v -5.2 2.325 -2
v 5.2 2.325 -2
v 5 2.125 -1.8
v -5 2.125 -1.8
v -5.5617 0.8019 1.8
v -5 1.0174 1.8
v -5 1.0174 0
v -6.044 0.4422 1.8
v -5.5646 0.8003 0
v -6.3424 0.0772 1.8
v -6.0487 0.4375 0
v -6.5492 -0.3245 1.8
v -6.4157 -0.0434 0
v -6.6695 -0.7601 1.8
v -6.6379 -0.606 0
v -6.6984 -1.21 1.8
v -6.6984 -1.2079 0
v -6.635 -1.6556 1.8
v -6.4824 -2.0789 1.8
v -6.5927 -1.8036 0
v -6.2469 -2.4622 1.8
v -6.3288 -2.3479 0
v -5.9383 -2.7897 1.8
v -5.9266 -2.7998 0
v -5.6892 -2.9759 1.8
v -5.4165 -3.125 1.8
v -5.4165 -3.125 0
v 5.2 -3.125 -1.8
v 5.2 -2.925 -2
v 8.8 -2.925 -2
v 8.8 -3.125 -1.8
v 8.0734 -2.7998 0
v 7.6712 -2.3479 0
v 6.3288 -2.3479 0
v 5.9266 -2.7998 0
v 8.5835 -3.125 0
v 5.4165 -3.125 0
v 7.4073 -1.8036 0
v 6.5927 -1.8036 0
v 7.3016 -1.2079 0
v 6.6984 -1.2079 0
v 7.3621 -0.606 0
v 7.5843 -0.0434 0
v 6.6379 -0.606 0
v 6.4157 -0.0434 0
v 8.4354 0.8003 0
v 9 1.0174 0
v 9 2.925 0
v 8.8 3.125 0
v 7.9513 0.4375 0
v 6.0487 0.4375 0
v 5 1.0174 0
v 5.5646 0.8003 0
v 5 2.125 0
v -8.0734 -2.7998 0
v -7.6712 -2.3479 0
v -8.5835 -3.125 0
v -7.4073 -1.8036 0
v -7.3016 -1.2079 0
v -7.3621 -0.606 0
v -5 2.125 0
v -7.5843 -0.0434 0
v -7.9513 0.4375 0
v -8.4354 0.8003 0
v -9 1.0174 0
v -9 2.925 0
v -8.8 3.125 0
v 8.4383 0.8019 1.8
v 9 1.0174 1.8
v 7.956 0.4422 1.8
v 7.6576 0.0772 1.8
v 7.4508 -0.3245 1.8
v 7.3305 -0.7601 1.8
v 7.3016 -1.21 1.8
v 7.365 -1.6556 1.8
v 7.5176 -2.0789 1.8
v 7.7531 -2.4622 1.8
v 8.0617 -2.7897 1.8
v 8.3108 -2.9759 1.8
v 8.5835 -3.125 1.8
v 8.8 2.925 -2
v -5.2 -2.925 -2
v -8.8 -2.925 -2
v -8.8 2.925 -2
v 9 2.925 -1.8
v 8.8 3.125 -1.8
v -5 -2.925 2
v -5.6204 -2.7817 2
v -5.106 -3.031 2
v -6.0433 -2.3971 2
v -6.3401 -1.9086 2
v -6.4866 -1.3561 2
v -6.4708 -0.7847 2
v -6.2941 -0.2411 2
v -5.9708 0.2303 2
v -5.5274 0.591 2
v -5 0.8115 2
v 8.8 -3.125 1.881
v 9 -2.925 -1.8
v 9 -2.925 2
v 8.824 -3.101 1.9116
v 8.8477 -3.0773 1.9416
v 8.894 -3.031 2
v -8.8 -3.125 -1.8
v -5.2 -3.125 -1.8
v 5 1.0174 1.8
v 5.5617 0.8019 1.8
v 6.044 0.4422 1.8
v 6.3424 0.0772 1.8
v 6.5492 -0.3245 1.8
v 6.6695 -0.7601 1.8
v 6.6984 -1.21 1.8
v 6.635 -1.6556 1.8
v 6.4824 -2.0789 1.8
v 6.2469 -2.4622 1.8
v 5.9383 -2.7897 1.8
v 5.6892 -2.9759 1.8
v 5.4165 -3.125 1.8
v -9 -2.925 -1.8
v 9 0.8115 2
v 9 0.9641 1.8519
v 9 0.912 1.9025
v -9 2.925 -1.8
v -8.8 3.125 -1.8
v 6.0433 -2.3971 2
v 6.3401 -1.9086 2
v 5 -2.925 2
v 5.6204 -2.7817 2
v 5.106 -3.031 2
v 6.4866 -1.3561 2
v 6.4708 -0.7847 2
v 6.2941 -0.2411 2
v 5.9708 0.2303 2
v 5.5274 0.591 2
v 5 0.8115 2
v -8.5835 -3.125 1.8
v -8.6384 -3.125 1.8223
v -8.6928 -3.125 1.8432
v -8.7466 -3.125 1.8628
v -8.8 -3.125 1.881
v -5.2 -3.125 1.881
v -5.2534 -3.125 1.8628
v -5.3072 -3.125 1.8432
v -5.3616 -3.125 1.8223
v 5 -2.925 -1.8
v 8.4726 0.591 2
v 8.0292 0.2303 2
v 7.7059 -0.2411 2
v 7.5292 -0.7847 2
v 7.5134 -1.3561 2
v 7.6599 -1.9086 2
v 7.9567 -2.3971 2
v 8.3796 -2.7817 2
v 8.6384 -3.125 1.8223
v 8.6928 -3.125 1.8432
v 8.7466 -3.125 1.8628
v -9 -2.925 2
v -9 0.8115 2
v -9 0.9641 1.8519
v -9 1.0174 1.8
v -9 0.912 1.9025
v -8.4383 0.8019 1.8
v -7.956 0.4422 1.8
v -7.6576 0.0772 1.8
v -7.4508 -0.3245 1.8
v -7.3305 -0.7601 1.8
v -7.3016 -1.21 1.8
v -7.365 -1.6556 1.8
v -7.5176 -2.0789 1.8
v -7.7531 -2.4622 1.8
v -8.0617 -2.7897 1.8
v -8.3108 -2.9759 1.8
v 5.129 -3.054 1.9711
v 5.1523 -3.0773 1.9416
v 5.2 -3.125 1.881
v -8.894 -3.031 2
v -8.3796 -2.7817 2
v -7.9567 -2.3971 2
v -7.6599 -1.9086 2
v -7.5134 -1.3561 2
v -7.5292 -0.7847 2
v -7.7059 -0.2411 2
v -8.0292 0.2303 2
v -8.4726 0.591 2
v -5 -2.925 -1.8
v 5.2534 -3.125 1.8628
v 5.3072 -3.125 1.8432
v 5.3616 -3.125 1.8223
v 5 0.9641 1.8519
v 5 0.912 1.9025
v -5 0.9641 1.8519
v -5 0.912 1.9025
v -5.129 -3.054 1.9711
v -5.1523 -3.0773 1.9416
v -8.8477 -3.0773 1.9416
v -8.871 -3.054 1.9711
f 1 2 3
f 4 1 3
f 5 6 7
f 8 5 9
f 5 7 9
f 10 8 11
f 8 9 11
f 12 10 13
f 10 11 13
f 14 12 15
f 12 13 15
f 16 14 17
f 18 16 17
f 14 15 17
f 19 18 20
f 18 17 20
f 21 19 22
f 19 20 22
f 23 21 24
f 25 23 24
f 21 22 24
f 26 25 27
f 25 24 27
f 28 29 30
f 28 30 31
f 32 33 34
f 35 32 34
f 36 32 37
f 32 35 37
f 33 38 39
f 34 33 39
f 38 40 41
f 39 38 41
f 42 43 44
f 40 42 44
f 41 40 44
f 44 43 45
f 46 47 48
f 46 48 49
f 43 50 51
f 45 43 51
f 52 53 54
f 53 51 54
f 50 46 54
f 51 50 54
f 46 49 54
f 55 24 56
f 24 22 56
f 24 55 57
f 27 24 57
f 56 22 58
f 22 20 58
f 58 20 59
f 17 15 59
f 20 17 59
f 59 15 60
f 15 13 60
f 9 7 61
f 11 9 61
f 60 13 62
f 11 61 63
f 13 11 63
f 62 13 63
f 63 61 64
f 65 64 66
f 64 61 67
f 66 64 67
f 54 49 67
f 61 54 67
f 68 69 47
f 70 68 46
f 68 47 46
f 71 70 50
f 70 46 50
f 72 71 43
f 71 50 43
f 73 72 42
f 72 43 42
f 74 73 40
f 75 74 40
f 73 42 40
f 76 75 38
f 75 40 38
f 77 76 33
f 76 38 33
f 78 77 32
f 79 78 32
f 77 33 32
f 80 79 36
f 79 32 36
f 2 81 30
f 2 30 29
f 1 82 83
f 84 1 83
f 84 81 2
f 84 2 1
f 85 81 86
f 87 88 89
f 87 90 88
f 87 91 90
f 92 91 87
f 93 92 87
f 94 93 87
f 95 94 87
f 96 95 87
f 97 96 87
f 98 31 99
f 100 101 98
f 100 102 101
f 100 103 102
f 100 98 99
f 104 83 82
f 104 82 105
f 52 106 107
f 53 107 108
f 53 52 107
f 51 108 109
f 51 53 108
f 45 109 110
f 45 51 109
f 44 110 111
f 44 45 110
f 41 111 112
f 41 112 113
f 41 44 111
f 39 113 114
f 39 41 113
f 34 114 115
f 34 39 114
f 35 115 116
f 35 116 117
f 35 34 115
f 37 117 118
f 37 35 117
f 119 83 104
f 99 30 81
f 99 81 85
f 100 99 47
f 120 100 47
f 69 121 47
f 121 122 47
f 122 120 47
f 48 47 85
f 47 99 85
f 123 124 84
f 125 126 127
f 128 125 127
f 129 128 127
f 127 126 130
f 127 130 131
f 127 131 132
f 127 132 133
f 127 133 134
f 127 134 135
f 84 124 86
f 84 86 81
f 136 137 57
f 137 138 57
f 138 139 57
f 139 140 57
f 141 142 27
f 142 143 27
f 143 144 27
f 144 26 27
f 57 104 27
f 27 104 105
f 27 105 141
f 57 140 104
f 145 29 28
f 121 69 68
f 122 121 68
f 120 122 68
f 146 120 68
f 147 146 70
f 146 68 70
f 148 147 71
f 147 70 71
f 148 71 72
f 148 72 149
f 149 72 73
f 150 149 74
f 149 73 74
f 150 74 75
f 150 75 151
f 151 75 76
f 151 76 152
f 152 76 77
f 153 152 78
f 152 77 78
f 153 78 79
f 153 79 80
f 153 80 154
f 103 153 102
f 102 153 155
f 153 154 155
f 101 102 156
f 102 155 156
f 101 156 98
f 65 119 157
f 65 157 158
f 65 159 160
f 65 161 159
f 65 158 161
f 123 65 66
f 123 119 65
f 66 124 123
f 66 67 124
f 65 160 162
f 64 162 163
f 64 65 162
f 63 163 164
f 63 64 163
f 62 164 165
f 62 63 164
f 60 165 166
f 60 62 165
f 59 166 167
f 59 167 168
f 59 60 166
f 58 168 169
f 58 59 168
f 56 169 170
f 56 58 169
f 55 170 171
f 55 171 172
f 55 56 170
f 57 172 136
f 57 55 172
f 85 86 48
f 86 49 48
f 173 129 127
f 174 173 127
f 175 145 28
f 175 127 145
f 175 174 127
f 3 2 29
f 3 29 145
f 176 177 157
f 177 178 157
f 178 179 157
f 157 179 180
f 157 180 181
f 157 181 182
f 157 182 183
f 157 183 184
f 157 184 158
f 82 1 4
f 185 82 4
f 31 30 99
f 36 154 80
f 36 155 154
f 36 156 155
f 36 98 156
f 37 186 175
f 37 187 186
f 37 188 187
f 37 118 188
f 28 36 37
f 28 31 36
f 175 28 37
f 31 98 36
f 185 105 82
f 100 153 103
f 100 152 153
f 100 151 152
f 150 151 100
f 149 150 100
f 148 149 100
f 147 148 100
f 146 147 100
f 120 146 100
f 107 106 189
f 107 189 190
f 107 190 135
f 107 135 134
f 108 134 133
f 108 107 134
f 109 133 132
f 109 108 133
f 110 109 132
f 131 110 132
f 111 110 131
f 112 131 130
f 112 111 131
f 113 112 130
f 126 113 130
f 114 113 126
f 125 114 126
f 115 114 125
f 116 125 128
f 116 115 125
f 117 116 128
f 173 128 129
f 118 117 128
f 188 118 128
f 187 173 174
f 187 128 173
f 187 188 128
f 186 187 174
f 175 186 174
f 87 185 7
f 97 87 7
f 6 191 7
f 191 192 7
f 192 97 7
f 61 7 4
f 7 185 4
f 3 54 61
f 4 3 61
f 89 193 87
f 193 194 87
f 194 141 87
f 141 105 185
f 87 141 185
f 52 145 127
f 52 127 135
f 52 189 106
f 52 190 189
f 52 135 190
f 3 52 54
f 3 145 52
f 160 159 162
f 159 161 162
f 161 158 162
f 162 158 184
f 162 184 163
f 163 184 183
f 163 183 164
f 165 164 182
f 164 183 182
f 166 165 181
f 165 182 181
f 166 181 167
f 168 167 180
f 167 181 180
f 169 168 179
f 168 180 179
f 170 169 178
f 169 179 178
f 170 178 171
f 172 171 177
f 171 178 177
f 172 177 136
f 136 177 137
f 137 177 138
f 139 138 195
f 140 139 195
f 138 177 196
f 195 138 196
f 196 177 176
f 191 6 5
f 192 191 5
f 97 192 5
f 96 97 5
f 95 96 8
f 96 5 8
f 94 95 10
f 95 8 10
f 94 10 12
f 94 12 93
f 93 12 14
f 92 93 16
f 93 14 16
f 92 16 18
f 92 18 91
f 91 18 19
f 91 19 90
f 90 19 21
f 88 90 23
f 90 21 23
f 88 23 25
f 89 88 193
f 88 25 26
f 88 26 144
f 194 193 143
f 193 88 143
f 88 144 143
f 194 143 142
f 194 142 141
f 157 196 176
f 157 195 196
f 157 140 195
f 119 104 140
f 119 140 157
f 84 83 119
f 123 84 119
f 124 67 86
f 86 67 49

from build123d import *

# Parameters (mm, degrees)
BOSS_EXTRUDE1_DEPTH  = 2
BOSS_EXTRUDE2_DEPTH  = 2
MIRROR2_COPY_1_DEPTH = 2


with BuildPart() as part:
    # Sketch1 → Boss-Extrude1 (new body)
    with BuildSketch(Plane.XY):
        Polygon((-9, 3.125), (9, 3.125), (9, -3.125), (5, -3.125), (5, 2.125), (-5, 2.125), (-5, -3.125), (-9, -3.125), align=None)
    extrude(amount=-BOSS_EXTRUDE1_DEPTH)

    # Sketch2 → Boss-Extrude2 (add)
    with BuildSketch(Plane.XY):
        with BuildLine():
            Line((9, -3.125), (9, 1.017428529))
            ThreePointArc((9, 1.017428529), (7.311037389, -0.904903006), (8.583484861, -3.125))
            Line((8.583484861, -3.125), (9, -3.125))
        make_face()
    boss_extrude2 = extrude(amount=BOSS_EXTRUDE2_DEPTH)

    # Mirror1: Boss-Extrude2 across plane
    add(boss_extrude2.mirror(Plane(origin=(7, 0, 0), x_dir=(0, 0, 1), z_dir=(1, 0, 0))))

    # Mirror2: Boss-Extrude2 across plane
    add(boss_extrude2.mirror(Plane(origin=(0, 0, 0), x_dir=(0, 0, 1), z_dir=(1, 0, 0))))

    # Mirror2 copy 1 sketch → Mirror2 copy 1 (add)
    with BuildSketch(Plane(origin=(-14, 0, 0), x_dir=(1, 0, 0), z_dir=(0, 0, 1))):
        with BuildLine():
            Line((9, -3.125), (9, 1.017428529))
            ThreePointArc((9, 1.017428529), (7.311037389, -0.904903006), (8.583484861, -3.125))
            Line((8.583484861, -3.125), (9, -3.125))
        make_face()
    extrude(amount=MIRROR2_COPY_1_DEPTH)

    # Deburs
    # the kernel refuses this chamfer: 0.2 mm, written as the material it takes off along each edge
    with BuildSketch(Plane(origin=(-8.866666667, 2.991666667, -1.866666667), x_dir=(0, -0.7071067811865479, -0.7071067811865471), z_dir=(-0.5773502691896264, 0.5773502691896251, -0.5773502691896257)), Plane(origin=(5.133333333, -2.991666667, -1.866666667), x_dir=(0, -0.7071067811865479, 0.7071067811865471), z_dir=(-0.5773502691896256, -0.5773502691896256, -0.5773502691896262)), Plane(origin=(-8.866666667, -2.991666667, -1.866666667), x_dir=(0, -0.7071067811865479, 0.7071067811865471), z_dir=(-0.5773502691896272, -0.5773502691896246, -0.5773502691896253))) as deburs_piece_1:
        Polygon((-0.141421356, -0.081649658), (0.141421356, -0.081649658), (0, 0.163299316), align=None)
    extrude(amount=0.254034118, mode=Mode.SUBTRACT)
    with BuildSketch(Plane(origin=(8.866666667, 2.991666667, -1.866666667), x_dir=(0, -0.7071067811865479, -0.7071067811865471), z_dir=(0.5773502691896272, 0.5773502691896246, -0.5773502691896253)), Plane(origin=(8.866666667, -2.991666667, -1.866666667), x_dir=(-0.7071067811865465, 0, -0.7071067811865488), z_dir=(0.5773502691896272, -0.5773502691896246, -0.5773502691896253)), Plane(origin=(-5.133333333, -2.991666667, -1.866666667), x_dir=(3.140184917367542e-15, -0.7071067811865464, 0.7071067811865487), z_dir=(0.5773502691896256, -0.5773502691896255, -0.5773502691896262))) as deburs_piece_2:
        Polygon((-0.141421356, 0.081649658), (0.141421356, 0.081649658), (0, -0.163299316), align=None)
    extrude(amount=0.254034118, mode=Mode.SUBTRACT)
    with BuildSketch(Plane(origin=(-9.514336598, 3.125, -2), x_dir=(0, 0.02749587661058736, 0.9996219169112966), z_dir=(1, 0, 0))) as deburs_piece_3:
        with BuildLine():
            Line((0.205734639, 0), (-0.011309431, 0.205423559))
            Line((-0.011309431, 0.205423559), (-0.015307919, 0.205313575))
            ThreePointArc((-0.015307919, 0.205313575), (-0.006825845, 0.102679566), (-0.003998488, -0.000109984))
            Line((-0.003998488, -0.000109984), (0.000109984, -0.003998488))
            ThreePointArc((0.000109984, -0.003998488), (0.102899533, -0.00117113), (0.205844623, -0.003998488))
            Line((0.205844623, -0.003998488), (0.205734639, 0))
        make_face()
    extrude(amount=19.028673195, mode=Mode.SUBTRACT)
    with BuildSketch(Plane(origin=(9, 3.125, 0.514336598), x_dir=(-0.9996219169112966, 0.02749587661058742, 0), z_dir=(0, 0, -1))) as deburs_piece_4:
        with BuildLine():
            Line((0.205734639, 0), (-0.011309431, -0.205423559))
            Line((-0.011309431, -0.205423559), (-0.015307919, -0.205313575))
            ThreePointArc((-0.015307919, -0.205313575), (-0.006825845, -0.102679566), (-0.003998488, 0.000109984))
            Line((-0.003998488, 0.000109984), (0.000109984, 0.003998488))
            ThreePointArc((0.000109984, 0.003998488), (0.102899533, 0.00117113), (0.205844623, 0.003998488))
            Line((0.205844623, 0.003998488), (0.205734639, 0))
        make_face()
    extrude(amount=3.028673195, mode=Mode.SUBTRACT)
    with BuildSketch(Plane(origin=(9, 3.639336598, -2), x_dir=(-0.9996219169112966, 0, -0.02749587661058742), z_dir=(0, -1, 0)), Plane(origin=(-9, -3.639336598, -2), x_dir=(0.9996219169112966, 0, -0.02749587661058742), z_dir=(0, 1, 0))) as deburs_piece_5:
        with BuildLine():
            Line((0.205734639, 0), (-0.011309431, -0.205423559))
            Line((-0.011309431, -0.205423559), (-0.015307919, -0.205313575))
            ThreePointArc((-0.015307919, -0.205313575), (-0.006825845, -0.102679566), (-0.003998488, 0.000109984))
            Line((-0.003998488, 0.000109984), (0.000109984, 0.003998488))
            ThreePointArc((0.000109984, 0.003998488), (0.102899533, 0.00117113), (0.205844623, 0.003998488))
            Line((0.205844623, 0.003998488), (0.205734639, 0))
        make_face()
    extrude(amount=7.278673195, mode=Mode.SUBTRACT)
    with BuildSketch(Plane(origin=(9, -3.125, 2.514336598), x_dir=(-0.9996219169112966, -0.02749587661058742, 0), z_dir=(0, 0, -1)), Plane(origin=(5, -3.125, 2.514336598), x_dir=(-0.027495876610587302, 0.9996219169112966, 0), z_dir=(0, 0, -1)), Plane(origin=(-9, -3.125, -2.514336598), x_dir=(0.9996219169112966, -0.02749587661058742, -1.3226059551012301e-15), z_dir=(0, 0, 1))) as deburs_piece_6:
        with BuildLine():
            Line((0.205734639, 0), (-0.011309431, 0.205423559))
            Line((-0.011309431, 0.205423559), (-0.015307919, 0.205313575))
            ThreePointArc((-0.015307919, 0.205313575), (-0.006825845, 0.102679566), (-0.003998488, -0.000109984))
            Line((-0.003998488, -0.000109984), (0.000109984, -0.003998488))
            ThreePointArc((0.000109984, -0.003998488), (0.102899533, -0.00117113), (0.205844623, -0.003998488))
            Line((0.205844623, -0.003998488), (0.205734639, 0))
        make_face()
    extrude(amount=5.028673195, mode=Mode.SUBTRACT)
    with BuildSketch(Plane(origin=(9.514336598, -3.125, -2), x_dir=(0, 0.9996219169112966, -0.027495876610587302), z_dir=(-1, 0, 0)), Plane(origin=(-5, -3.125, -2.514336598), x_dir=(-0.9996219169112966, -0.027495876610587302, 4.0013970761285496e-15), z_dir=(0, 0, 1)), Plane(origin=(-4.485663402, -3.125, -2), x_dir=(0, 0.9996219169112966, -0.027495876610587302), z_dir=(-1, 0, 0))) as deburs_piece_7:
        with BuildLine():
            Line((0.205734639, 0), (-0.011309431, -0.205423559))
            Line((-0.011309431, -0.205423559), (-0.015307919, -0.205313575))
            ThreePointArc((-0.015307919, -0.205313575), (-0.006825845, -0.102679566), (-0.003998488, 0.000109984))
            Line((-0.003998488, 0.000109984), (0.000109984, 0.003998488))
            ThreePointArc((0.000109984, 0.003998488), (0.102899533, 0.00117113), (0.205844623, 0.003998488))
            Line((0.205844623, 0.003998488), (0.205734639, 0))
        make_face()
    extrude(amount=5.028673195, mode=Mode.SUBTRACT)
    with BuildSketch(Plane(origin=(5, -3.639336598, -2), x_dir=(0.9996219169112966, 0, -0.027495876610587302), z_dir=(0, 1, 0)), Plane(origin=(-5, 2.125, -2), x_dir=(-0.9996219169112966, 0, -0.027495876610587302), z_dir=(0, -1, 0))) as deburs_piece_8:
        with BuildLine():
            Line((0.205734639, 0), (-0.011309431, -0.205423559))
            Line((-0.011309431, -0.205423559), (-0.015307919, -0.205313575))
            ThreePointArc((-0.015307919, -0.205313575), (-0.006825845, -0.102679566), (-0.003998488, 0.000109984))
            Line((-0.003998488, 0.000109984), (0.000109984, 0.003998488))
            ThreePointArc((0.000109984, 0.003998488), (0.102899533, 0.00117113), (0.205844623, 0.003998488))
            Line((0.205844623, 0.003998488), (0.205734639, 0))
        make_face()
    extrude(amount=5.764336598, mode=Mode.SUBTRACT)
    with BuildSketch(Plane(origin=(5, 2.125, -2), x_dir=(0, 0.9996219169112966, -0.027495876610587302), z_dir=(-1, 0, 0))) as deburs_piece_9:
        with BuildLine():
            Line((0.205734639, 0), (-0.011309431, -0.205423559))
            Line((-0.011309431, -0.205423559), (-0.015307919, -0.205313575))
            ThreePointArc((-0.015307919, -0.205313575), (-0.006825845, -0.102679566), (-0.003998488, 0.000109984))
            Line((-0.003998488, 0.000109984), (0.000109984, 0.003998488))
            ThreePointArc((0.000109984, 0.003998488), (0.102899533, 0.00117113), (0.205844623, 0.003998488))
            Line((0.205844623, 0.003998488), (0.205734639, 0))
        make_face()
    extrude(amount=10, mode=Mode.SUBTRACT)
    with BuildSketch(Plane(origin=(-9, 3.125, 0.514336598), x_dir=(0.9996219169112966, 0.02749587661058742, 0), z_dir=(0, 0, -1))) as deburs_piece_10:
        with BuildLine():
            Line((0.205734639, 0), (-0.011309431, 0.205423559))
            Line((-0.011309431, 0.205423559), (-0.015307919, 0.205313575))
            ThreePointArc((-0.015307919, 0.205313575), (-0.006825845, 0.102679566), (-0.003998488, -0.000109984))
            Line((-0.003998488, -0.000109984), (0.000109984, -0.003998488))
            ThreePointArc((0.000109984, -0.003998488), (0.102899533, -0.00117113), (0.205844623, -0.003998488))
            Line((0.205844623, -0.003998488), (0.205734639, 0))
        make_face()
    extrude(amount=3.028673195, mode=Mode.SUBTRACT)
    with BuildSketch(Plane(origin=(9.5, -1.125, 2), x_dir=(0.004747833317757314, 0.9999887289758754, 0), z_dir=(0.9999887289758754, -0.004747833317757314, 0))) as deburs_piece_11:
        with BuildLine():
            Line((1.994343146, 0.005656854), (2.205656854, -0.205656854))
            Line((2.205656854, -0.205656854), (2.209656854, -0.205656854))
            ThreePointArc((2.209656854, -0.205656854), (2.204, -0.102828427), (2.204, 0))
            Line((2.204, 0), (2.2, 0.004))
            ThreePointArc((2.2, 0.004), (2.097171573, 0.004), (1.994343146, 0.009656854))
            Line((1.994343146, 0.009656854), (1.994343146, 0.005656854))
        make_face()
    revolve(axis=Axis((9.5, -1.125, 2), (0, 0, 1)), revolution_arc=169.060645124, mode=Mode.SUBTRACT)
    with BuildSketch(Plane(origin=(4.5, -1.125, 2), x_dir=(-0.004747833317757314, 0.9999887289758754, 0), z_dir=(-0.9999887289758754, -0.004747833317757314, 0))) as deburs_piece_12:
        with BuildLine():
            Line((1.994343146, -0.005656854), (2.205656854, 0.205656854))
            Line((2.205656854, 0.205656854), (2.209656854, 0.205656854))
            ThreePointArc((2.209656854, 0.205656854), (2.204, 0.102828427), (2.204, 0))
            Line((2.204, 0), (2.2, -0.004))
            ThreePointArc((2.2, -0.004), (2.097171573, -0.004), (1.994343146, -0.009656854))
            Line((1.994343146, -0.009656854), (1.994343146, -0.005656854))
        make_face()
    revolve(axis=Axis((4.5, -1.125, 2), (0, 0, -1)), revolution_arc=169.060645124, mode=Mode.SUBTRACT)
    with BuildSketch(Plane(origin=(-4.5, -1.125, 2), x_dir=(0.004747833317757314, 0.9999887289758754, 0), z_dir=(0.9999887289758754, -0.004747833317757314, 0))) as deburs_piece_13:
        with BuildLine():
            Line((1.994343146, 0.005656854), (2.205656854, -0.205656854))
            Line((2.205656854, -0.205656854), (2.209656854, -0.205656854))
            ThreePointArc((2.209656854, -0.205656854), (2.204, -0.102828427), (2.204, 0))
            Line((2.204, 0), (2.2, 0.004))
            ThreePointArc((2.2, 0.004), (2.097171573, 0.004), (1.994343146, 0.009656854))
            Line((1.994343146, 0.009656854), (1.994343146, 0.005656854))
        make_face()
    revolve(axis=Axis((-4.5, -1.125, 2), (0, 0, 1)), revolution_arc=169.060645124, mode=Mode.SUBTRACT)
    with BuildSketch(Plane(origin=(-9.5, -1.125, 2), x_dir=(-0.004747833317757314, 0.9999887289758754, 0), z_dir=(-0.9999887289758754, -0.004747833317757314, 0))) as deburs_piece_14:
        with BuildLine():
            Line((2.205656854, 0.205656854), (1.994343146, -0.005656854))
            Line((1.994343146, -0.005656854), (1.994343146, -0.009656854))
            ThreePointArc((1.994343146, -0.009656854), (2.097171573, -0.004), (2.2, -0.004))
            Line((2.2, -0.004), (2.204, 0))
            ThreePointArc((2.204, 0), (2.204, 0.102828427), (2.209656854, 0.205656854))
            Line((2.209656854, 0.205656854), (2.205656854, 0.205656854))
        make_face()
    revolve(axis=Axis((-9.5, -1.125, 2), (0, 0, -1)), revolution_arc=169.060645124, mode=Mode.SUBTRACT)
    with BuildSketch(Plane(origin=(5, -3.639336598, -2), x_dir=(0.9996219169112966, 0, -0.027495876610587302), z_dir=(0, 1, 0))) as deburs_piece_15a_section:
        with BuildLine():
            Line((0.205734639, 0), (-0.011309431, -0.205423559))
            Line((-0.011309431, -0.205423559), (-0.015307919, -0.205313575))
            ThreePointArc((-0.015307919, -0.205313575), (-0.006825845, -0.102679566), (-0.003998488, 0.000109984))
            Line((-0.003998488, 0.000109984), (0.000109984, 0.003998488))
            ThreePointArc((0.000109984, 0.003998488), (0.102899533, 0.00117113), (0.205844623, 0.003998488))
            Line((0.205844623, 0.003998488), (0.205734639, 0))
        make_face()
    deburs_piece_15a = extrude(amount=6.278673195, mode=Mode.PRIVATE)
    deburs_piece_15a = split(deburs_piece_15a, bisect_by=Plane(origin=(5.065958725, 2.125, -1.934041275), z_dir=(0, 1, 0)), keep=Keep.TOP, mode=Mode.PRIVATE)
    with BuildSketch(Plane(origin=(5.514336598, 2.125, -2), x_dir=(0, 0.9996219169112966, -0.027495876610587302), z_dir=(-1, 0, 0))) as deburs_piece_15b_section:
        with BuildLine():
            Line((0.205734639, 0), (-0.011309431, -0.205423559))
            Line((-0.011309431, -0.205423559), (-0.015307919, -0.205313575))
            ThreePointArc((-0.015307919, -0.205313575), (-0.006825845, -0.102679566), (-0.003998488, 0.000109984))
            Line((-0.003998488, 0.000109984), (0.000109984, 0.003998488))
            ThreePointArc((0.000109984, 0.003998488), (0.102899533, 0.00117113), (0.205844623, 0.003998488))
            Line((0.205844623, 0.003998488), (0.205734639, 0))
        make_face()
    deburs_piece_15b = extrude(amount=10.514336598, mode=Mode.PRIVATE)
    deburs_piece_15b = split(deburs_piece_15b, bisect_by=Plane(origin=(5, 2.190958725, -1.934041275), z_dir=(1, 0, 0)), keep=Keep.TOP, mode=Mode.PRIVATE)
    deburs_piece_15 = deburs_piece_15a & deburs_piece_15b
    add(deburs_piece_15, mode=Mode.SUBTRACT)
    with BuildSketch(Plane(origin=(5, 2.125, -2), x_dir=(0, 0.9996219169112966, -0.027495876610587302), z_dir=(-1, 0, 0))) as deburs_piece_16a_section:
        with BuildLine():
            Line((0.205734639, 0), (-0.011309431, -0.205423559))
            Line((-0.011309431, -0.205423559), (-0.015307919, -0.205313575))
            ThreePointArc((-0.015307919, -0.205313575), (-0.006825845, -0.102679566), (-0.003998488, 0.000109984))
            Line((-0.003998488, 0.000109984), (0.000109984, 0.003998488))
            ThreePointArc((0.000109984, 0.003998488), (0.102899533, 0.00117113), (0.205844623, 0.003998488))
            Line((0.205844623, 0.003998488), (0.205734639, 0))
        make_face()
    deburs_piece_16a = extrude(amount=10.514336598, mode=Mode.PRIVATE)
    deburs_piece_16a = split(deburs_piece_16a, bisect_by=Plane(origin=(-5, 2.190958725, -1.934041275), z_dir=(-1, 0, 0)), keep=Keep.TOP, mode=Mode.PRIVATE)
    with BuildSketch(Plane(origin=(-5, 2.639336598, -2), x_dir=(-0.9996219169112966, 0, -0.027495876610587302), z_dir=(0, -1, 0))) as deburs_piece_16b_section:
        with BuildLine():
            Line((0.205734639, 0), (-0.011309431, -0.205423559))
            Line((-0.011309431, -0.205423559), (-0.015307919, -0.205313575))
            ThreePointArc((-0.015307919, -0.205313575), (-0.006825845, -0.102679566), (-0.003998488, 0.000109984))
            Line((-0.003998488, 0.000109984), (0.000109984, 0.003998488))
            ThreePointArc((0.000109984, 0.003998488), (0.102899533, 0.00117113), (0.205844623, 0.003998488))
            Line((0.205844623, 0.003998488), (0.205734639, 0))
        make_face()
    deburs_piece_16b = extrude(amount=6.278673195, mode=Mode.PRIVATE)
    deburs_piece_16b = split(deburs_piece_16b, bisect_by=Plane(origin=(-5.065958725, 2.125, -1.934041275), z_dir=(0, 1, 0)), keep=Keep.TOP, mode=Mode.PRIVATE)
    deburs_piece_16 = deburs_piece_16a & deburs_piece_16b
    add(deburs_piece_16, mode=Mode.SUBTRACT)


solid = part.part
